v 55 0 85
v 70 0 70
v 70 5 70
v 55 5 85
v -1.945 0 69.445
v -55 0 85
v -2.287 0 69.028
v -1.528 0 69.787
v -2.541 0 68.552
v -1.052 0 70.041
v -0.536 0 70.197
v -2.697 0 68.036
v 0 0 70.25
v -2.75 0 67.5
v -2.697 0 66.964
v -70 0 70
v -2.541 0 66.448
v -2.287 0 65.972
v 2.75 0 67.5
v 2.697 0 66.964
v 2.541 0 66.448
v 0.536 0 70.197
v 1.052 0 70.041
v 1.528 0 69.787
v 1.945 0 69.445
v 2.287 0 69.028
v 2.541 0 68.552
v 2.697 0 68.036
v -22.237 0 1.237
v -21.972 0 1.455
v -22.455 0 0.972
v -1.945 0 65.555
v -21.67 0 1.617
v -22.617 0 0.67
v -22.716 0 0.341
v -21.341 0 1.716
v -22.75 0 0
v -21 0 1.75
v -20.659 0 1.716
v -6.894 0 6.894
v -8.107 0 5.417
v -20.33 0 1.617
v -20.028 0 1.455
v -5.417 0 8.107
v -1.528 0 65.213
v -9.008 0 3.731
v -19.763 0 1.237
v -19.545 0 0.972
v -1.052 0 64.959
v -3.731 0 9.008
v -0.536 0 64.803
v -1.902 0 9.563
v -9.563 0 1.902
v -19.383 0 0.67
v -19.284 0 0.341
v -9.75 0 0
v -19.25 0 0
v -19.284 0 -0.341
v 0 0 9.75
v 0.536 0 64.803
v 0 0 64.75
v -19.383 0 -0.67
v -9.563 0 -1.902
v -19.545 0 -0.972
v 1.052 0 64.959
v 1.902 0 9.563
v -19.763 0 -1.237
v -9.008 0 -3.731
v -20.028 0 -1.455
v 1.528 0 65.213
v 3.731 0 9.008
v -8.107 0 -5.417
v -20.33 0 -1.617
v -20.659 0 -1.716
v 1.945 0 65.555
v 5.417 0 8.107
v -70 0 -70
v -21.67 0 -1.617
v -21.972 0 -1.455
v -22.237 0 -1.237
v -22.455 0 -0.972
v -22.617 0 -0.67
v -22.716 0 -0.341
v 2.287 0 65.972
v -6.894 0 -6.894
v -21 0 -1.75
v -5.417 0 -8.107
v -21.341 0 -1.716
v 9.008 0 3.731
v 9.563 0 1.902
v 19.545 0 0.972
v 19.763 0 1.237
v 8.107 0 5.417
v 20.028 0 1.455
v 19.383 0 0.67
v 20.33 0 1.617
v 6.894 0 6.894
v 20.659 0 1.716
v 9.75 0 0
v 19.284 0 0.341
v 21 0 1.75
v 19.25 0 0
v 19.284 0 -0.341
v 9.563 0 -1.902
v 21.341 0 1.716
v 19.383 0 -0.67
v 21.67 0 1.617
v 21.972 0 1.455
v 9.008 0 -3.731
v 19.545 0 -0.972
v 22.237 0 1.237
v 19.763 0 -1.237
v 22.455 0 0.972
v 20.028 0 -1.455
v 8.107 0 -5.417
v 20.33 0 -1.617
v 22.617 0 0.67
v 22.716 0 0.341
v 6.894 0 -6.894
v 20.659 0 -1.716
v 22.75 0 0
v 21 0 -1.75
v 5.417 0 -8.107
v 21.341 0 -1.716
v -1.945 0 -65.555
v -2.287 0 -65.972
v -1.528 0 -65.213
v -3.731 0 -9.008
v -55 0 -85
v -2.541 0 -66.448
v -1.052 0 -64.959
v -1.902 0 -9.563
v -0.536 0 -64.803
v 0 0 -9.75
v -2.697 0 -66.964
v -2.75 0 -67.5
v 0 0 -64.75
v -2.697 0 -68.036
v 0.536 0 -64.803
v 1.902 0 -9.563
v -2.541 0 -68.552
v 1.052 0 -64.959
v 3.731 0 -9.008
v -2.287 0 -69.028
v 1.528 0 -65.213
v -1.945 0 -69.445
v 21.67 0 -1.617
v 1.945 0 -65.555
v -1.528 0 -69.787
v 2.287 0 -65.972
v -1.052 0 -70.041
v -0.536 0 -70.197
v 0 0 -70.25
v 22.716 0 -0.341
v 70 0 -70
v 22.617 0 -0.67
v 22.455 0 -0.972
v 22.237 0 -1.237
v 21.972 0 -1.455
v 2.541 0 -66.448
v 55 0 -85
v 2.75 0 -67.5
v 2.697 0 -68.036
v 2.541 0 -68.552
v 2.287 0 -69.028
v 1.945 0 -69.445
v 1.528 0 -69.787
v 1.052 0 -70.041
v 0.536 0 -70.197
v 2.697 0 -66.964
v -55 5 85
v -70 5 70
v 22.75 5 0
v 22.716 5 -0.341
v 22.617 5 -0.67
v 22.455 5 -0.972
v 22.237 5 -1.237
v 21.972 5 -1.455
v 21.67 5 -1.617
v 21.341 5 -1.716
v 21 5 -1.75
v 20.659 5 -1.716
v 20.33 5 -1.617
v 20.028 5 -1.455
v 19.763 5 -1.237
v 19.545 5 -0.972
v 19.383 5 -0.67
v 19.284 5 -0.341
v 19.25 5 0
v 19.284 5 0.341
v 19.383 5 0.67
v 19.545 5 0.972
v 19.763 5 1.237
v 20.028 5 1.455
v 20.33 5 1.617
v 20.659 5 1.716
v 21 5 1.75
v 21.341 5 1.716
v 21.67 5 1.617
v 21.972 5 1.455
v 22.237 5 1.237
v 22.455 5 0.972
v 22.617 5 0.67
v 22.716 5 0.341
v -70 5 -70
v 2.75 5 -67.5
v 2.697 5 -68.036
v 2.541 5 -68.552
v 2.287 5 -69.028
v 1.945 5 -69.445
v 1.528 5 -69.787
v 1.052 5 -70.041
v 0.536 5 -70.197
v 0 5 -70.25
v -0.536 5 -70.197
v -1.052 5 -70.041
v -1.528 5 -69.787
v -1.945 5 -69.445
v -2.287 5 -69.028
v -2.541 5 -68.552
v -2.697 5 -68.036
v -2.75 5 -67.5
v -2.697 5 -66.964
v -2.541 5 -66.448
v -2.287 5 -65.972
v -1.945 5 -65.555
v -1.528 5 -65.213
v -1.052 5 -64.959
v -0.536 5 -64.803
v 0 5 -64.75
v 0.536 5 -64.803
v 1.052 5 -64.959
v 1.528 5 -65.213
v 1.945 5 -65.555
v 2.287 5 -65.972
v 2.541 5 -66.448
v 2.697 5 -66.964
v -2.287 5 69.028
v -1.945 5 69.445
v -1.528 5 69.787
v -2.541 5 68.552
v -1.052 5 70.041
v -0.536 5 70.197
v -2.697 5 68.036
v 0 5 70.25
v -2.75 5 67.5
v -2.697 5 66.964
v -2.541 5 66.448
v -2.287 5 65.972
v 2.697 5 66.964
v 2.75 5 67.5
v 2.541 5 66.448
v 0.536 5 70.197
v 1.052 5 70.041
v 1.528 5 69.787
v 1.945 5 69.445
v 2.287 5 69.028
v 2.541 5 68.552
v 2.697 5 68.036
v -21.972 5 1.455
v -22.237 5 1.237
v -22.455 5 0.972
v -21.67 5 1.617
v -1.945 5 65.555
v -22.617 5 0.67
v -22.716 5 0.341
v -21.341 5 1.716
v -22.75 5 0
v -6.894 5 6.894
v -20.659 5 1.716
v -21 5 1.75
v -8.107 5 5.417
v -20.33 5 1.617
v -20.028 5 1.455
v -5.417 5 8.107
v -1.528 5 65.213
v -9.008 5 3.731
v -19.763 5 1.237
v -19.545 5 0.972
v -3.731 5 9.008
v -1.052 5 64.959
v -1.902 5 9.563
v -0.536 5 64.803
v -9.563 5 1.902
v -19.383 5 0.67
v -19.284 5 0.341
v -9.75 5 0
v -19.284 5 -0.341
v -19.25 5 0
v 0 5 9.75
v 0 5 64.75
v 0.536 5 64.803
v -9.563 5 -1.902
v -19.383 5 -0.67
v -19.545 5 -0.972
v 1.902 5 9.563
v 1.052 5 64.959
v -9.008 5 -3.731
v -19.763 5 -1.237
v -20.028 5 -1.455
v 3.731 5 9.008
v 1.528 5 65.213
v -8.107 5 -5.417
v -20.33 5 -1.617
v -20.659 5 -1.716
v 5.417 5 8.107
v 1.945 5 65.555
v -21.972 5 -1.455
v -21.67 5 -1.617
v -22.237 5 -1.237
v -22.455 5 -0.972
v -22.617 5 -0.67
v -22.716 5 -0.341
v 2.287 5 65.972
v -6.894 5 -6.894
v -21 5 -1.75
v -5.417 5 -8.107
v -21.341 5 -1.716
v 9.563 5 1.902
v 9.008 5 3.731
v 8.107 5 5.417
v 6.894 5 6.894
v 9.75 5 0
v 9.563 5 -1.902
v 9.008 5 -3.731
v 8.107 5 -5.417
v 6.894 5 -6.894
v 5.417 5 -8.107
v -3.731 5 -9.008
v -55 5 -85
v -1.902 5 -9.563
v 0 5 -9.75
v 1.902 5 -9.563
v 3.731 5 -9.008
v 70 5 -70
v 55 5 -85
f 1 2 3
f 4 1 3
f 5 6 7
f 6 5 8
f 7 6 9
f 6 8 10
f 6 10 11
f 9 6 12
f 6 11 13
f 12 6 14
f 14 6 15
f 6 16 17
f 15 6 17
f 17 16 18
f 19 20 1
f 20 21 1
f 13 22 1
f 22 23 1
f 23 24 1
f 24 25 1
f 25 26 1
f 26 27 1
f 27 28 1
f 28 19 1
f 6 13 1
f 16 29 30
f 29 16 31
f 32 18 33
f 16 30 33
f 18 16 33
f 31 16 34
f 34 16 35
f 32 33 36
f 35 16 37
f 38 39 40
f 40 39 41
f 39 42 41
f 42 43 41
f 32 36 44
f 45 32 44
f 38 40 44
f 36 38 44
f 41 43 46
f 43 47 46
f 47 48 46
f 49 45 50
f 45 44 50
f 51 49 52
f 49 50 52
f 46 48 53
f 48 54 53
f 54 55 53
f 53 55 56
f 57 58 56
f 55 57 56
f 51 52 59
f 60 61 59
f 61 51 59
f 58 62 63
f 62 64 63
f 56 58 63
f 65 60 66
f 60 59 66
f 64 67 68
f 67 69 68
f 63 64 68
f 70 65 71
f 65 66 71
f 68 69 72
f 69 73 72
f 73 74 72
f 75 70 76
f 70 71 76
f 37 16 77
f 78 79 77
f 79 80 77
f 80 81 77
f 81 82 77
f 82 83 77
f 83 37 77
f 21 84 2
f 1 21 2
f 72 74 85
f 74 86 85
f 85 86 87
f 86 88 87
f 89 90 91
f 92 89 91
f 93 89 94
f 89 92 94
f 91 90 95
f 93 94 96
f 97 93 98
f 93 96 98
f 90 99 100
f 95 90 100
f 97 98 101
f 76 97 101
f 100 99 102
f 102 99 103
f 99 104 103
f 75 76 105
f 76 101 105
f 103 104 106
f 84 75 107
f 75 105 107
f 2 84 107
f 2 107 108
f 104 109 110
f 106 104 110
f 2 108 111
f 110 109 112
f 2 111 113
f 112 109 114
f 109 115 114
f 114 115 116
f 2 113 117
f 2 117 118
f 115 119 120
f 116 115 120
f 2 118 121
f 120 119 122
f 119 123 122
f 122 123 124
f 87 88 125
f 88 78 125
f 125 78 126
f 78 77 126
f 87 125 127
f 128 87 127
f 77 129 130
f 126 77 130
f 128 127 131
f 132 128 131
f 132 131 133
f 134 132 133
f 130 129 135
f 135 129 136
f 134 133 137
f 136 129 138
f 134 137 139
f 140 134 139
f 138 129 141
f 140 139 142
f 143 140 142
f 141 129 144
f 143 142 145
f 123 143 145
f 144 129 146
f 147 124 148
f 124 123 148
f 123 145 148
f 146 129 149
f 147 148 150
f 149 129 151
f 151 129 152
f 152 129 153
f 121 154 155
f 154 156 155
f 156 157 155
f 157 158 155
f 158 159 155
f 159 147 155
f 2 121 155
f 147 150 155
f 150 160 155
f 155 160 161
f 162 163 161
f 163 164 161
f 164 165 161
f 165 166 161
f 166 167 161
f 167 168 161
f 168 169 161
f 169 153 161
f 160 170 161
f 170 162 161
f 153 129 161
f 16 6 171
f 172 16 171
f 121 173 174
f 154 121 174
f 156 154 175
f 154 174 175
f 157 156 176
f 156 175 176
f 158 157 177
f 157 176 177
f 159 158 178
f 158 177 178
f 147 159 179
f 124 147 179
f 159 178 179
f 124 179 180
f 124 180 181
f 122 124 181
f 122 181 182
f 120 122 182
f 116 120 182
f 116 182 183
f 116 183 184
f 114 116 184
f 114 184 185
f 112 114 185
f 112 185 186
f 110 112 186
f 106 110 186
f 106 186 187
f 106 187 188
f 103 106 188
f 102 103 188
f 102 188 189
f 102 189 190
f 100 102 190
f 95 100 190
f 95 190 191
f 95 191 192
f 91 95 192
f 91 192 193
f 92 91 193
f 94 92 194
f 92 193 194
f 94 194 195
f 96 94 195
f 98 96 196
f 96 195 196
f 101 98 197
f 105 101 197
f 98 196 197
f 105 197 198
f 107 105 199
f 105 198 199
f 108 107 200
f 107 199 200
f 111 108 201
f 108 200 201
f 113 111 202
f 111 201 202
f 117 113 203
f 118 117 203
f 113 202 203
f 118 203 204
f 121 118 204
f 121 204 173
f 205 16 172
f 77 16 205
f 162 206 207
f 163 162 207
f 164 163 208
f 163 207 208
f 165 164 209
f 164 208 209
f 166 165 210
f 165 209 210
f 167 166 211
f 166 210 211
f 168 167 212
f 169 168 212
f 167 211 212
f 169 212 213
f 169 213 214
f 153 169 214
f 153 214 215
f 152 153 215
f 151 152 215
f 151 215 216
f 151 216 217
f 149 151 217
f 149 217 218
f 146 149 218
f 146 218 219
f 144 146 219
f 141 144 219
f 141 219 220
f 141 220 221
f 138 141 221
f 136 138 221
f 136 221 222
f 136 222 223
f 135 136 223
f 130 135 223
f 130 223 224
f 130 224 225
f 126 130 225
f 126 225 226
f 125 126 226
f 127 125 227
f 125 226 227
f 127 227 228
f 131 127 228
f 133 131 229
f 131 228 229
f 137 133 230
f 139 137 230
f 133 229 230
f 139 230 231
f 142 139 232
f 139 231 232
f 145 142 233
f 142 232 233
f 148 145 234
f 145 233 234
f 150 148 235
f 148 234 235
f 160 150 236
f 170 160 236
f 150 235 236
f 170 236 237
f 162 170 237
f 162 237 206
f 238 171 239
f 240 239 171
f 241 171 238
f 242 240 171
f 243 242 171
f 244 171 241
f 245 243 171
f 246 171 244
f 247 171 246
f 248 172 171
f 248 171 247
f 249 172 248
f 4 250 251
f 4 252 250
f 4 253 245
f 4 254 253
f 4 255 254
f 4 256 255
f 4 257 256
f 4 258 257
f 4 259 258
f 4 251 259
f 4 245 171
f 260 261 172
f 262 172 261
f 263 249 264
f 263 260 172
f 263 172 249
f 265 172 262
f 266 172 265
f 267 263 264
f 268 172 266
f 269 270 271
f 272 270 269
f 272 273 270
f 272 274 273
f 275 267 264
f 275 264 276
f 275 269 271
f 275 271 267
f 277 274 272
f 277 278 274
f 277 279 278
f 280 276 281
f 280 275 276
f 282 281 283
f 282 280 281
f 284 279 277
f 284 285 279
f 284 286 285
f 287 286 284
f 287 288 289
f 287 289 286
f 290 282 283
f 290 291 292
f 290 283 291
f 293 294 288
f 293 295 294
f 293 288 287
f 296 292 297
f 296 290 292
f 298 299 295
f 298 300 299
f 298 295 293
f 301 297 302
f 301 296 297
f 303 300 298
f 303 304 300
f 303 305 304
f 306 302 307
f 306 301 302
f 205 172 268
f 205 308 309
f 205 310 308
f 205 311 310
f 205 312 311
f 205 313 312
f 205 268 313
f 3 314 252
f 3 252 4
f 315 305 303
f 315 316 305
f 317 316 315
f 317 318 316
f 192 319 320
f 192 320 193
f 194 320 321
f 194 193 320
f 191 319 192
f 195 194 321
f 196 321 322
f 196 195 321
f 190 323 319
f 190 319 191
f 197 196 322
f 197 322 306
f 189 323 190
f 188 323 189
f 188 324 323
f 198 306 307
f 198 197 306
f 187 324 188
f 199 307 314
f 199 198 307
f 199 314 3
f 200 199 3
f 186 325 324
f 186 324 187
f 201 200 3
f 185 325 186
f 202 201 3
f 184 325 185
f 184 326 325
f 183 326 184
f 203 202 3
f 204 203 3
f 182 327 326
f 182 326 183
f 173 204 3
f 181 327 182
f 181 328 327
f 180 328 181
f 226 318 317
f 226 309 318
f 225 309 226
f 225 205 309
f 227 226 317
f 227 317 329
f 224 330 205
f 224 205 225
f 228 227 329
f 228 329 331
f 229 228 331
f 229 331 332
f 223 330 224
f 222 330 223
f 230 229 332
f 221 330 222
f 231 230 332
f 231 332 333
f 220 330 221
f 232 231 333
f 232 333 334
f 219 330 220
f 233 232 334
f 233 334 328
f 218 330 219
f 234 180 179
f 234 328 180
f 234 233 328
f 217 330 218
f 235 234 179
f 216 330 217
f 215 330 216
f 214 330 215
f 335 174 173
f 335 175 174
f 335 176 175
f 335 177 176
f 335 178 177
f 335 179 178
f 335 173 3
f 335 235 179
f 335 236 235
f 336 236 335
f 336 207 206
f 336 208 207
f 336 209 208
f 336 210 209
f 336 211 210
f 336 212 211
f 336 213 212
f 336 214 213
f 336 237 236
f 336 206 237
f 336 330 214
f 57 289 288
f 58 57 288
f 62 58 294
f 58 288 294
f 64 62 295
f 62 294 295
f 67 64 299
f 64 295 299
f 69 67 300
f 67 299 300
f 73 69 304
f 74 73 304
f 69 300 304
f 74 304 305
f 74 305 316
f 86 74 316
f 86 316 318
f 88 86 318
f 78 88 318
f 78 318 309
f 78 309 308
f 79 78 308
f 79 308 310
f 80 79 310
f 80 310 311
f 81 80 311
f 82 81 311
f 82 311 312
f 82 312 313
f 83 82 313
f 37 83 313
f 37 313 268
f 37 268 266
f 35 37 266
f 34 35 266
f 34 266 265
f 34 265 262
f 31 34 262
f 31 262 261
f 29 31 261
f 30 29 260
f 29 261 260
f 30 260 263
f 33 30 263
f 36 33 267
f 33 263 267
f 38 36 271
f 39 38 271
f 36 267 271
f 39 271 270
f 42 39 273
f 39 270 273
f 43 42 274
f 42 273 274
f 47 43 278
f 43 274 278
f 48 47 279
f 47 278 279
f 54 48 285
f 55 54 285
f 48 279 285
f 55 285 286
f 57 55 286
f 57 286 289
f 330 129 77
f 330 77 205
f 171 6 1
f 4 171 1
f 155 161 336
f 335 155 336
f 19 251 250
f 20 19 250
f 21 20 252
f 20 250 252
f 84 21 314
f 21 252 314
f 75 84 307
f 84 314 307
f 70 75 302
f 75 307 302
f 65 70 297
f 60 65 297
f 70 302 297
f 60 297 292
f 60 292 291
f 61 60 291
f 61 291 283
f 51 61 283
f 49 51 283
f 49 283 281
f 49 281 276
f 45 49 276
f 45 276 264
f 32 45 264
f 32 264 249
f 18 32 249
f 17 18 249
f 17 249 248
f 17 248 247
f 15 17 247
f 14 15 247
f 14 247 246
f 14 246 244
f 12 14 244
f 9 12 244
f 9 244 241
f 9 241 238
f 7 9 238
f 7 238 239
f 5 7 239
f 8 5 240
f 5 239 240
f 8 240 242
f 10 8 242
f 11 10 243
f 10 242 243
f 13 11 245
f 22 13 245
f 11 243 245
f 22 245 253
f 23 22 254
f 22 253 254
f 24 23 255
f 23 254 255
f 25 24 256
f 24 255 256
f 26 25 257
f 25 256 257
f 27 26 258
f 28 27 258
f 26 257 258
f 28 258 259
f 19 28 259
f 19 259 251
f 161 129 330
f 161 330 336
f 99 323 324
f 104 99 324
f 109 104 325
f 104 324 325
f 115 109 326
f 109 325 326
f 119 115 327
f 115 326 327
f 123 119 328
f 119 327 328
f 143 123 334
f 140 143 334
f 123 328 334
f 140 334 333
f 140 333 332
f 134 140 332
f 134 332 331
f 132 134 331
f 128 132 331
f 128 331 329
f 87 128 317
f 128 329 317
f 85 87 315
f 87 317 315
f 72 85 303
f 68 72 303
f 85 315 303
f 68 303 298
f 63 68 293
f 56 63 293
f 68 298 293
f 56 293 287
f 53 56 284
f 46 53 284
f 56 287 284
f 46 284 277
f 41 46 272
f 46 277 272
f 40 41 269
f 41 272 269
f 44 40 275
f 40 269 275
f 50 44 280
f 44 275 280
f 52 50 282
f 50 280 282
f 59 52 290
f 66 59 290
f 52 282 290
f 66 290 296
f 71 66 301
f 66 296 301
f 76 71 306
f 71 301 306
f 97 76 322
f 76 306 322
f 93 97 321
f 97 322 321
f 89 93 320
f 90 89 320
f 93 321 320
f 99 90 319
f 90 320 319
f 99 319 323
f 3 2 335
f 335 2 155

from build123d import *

# Parameters (mm, degrees)
SKETCH1_W           = 140
SKETCH1_H           = 170
BOSS_EXTRUDE1_DEPTH = 5
CHAMFER1_SIZE       = 15
SKETCH2_R           = 9.75
CUT_EXTRUDE1_DEPTH  = 5
SKETCH3_R           = 2.75
CUT_EXTRUDE2_DEPTH  = 40
SKETCH4_R           = 1.75
CUT_EXTRUDE3_DEPTH  = 6


with BuildPart() as part:
    # Sketch1 → Boss-Extrude1 (new body)
    with BuildSketch(Plane(origin=(0, 0, 0), x_dir=(1, 0, 0), z_dir=(0, 1, 0))):
        Rectangle(SKETCH1_W, SKETCH1_H)
    extrude(amount=BOSS_EXTRUDE1_DEPTH)

    # Chamfer1
    chamfer1_edges = [part.edges().sort_by_distance(p)[0] for p in [
        (-70, 2.5, -85),
        (70, 2.5, -85),
        (70, 2.5, 85),
        (-70, 2.5, 85),
    ]]
    chamfer(chamfer1_edges, length=CHAMFER1_SIZE)

    # Sketch2 → Cut-Extrude1 (cut)
    with BuildSketch(Plane(origin=(0, 5, 0), x_dir=(1, 0, 0), z_dir=(0, 1, 0))):
        Circle(SKETCH2_R)
    extrude(amount=-CUT_EXTRUDE1_DEPTH, mode=Mode.SUBTRACT)

    # Sketch3 → Cut-Extrude2 (cut)
    with BuildSketch(Plane(origin=(0, 5, 0), x_dir=(1, 0, 0), z_dir=(0, 1, 0))):
        with Locations((0, -67.5)):
            Circle(SKETCH3_R)
        with Locations((0, 67.5)):
            Circle(SKETCH3_R)
    extrude(amount=-CUT_EXTRUDE2_DEPTH, mode=Mode.SUBTRACT)

    # Sketch4 → Cut-Extrude3 (cut, through all)
    with BuildSketch(Plane(origin=(0, 5, 0), x_dir=(1, 0, 0), z_dir=(0, 1, 0))):
        with Locations((-21, 0)):
            Circle(SKETCH4_R)
        with Locations((21, 0)):
            Circle(SKETCH4_R)
    extrude(amount=-CUT_EXTRUDE3_DEPTH, mode=Mode.SUBTRACT)


solid = part.part
